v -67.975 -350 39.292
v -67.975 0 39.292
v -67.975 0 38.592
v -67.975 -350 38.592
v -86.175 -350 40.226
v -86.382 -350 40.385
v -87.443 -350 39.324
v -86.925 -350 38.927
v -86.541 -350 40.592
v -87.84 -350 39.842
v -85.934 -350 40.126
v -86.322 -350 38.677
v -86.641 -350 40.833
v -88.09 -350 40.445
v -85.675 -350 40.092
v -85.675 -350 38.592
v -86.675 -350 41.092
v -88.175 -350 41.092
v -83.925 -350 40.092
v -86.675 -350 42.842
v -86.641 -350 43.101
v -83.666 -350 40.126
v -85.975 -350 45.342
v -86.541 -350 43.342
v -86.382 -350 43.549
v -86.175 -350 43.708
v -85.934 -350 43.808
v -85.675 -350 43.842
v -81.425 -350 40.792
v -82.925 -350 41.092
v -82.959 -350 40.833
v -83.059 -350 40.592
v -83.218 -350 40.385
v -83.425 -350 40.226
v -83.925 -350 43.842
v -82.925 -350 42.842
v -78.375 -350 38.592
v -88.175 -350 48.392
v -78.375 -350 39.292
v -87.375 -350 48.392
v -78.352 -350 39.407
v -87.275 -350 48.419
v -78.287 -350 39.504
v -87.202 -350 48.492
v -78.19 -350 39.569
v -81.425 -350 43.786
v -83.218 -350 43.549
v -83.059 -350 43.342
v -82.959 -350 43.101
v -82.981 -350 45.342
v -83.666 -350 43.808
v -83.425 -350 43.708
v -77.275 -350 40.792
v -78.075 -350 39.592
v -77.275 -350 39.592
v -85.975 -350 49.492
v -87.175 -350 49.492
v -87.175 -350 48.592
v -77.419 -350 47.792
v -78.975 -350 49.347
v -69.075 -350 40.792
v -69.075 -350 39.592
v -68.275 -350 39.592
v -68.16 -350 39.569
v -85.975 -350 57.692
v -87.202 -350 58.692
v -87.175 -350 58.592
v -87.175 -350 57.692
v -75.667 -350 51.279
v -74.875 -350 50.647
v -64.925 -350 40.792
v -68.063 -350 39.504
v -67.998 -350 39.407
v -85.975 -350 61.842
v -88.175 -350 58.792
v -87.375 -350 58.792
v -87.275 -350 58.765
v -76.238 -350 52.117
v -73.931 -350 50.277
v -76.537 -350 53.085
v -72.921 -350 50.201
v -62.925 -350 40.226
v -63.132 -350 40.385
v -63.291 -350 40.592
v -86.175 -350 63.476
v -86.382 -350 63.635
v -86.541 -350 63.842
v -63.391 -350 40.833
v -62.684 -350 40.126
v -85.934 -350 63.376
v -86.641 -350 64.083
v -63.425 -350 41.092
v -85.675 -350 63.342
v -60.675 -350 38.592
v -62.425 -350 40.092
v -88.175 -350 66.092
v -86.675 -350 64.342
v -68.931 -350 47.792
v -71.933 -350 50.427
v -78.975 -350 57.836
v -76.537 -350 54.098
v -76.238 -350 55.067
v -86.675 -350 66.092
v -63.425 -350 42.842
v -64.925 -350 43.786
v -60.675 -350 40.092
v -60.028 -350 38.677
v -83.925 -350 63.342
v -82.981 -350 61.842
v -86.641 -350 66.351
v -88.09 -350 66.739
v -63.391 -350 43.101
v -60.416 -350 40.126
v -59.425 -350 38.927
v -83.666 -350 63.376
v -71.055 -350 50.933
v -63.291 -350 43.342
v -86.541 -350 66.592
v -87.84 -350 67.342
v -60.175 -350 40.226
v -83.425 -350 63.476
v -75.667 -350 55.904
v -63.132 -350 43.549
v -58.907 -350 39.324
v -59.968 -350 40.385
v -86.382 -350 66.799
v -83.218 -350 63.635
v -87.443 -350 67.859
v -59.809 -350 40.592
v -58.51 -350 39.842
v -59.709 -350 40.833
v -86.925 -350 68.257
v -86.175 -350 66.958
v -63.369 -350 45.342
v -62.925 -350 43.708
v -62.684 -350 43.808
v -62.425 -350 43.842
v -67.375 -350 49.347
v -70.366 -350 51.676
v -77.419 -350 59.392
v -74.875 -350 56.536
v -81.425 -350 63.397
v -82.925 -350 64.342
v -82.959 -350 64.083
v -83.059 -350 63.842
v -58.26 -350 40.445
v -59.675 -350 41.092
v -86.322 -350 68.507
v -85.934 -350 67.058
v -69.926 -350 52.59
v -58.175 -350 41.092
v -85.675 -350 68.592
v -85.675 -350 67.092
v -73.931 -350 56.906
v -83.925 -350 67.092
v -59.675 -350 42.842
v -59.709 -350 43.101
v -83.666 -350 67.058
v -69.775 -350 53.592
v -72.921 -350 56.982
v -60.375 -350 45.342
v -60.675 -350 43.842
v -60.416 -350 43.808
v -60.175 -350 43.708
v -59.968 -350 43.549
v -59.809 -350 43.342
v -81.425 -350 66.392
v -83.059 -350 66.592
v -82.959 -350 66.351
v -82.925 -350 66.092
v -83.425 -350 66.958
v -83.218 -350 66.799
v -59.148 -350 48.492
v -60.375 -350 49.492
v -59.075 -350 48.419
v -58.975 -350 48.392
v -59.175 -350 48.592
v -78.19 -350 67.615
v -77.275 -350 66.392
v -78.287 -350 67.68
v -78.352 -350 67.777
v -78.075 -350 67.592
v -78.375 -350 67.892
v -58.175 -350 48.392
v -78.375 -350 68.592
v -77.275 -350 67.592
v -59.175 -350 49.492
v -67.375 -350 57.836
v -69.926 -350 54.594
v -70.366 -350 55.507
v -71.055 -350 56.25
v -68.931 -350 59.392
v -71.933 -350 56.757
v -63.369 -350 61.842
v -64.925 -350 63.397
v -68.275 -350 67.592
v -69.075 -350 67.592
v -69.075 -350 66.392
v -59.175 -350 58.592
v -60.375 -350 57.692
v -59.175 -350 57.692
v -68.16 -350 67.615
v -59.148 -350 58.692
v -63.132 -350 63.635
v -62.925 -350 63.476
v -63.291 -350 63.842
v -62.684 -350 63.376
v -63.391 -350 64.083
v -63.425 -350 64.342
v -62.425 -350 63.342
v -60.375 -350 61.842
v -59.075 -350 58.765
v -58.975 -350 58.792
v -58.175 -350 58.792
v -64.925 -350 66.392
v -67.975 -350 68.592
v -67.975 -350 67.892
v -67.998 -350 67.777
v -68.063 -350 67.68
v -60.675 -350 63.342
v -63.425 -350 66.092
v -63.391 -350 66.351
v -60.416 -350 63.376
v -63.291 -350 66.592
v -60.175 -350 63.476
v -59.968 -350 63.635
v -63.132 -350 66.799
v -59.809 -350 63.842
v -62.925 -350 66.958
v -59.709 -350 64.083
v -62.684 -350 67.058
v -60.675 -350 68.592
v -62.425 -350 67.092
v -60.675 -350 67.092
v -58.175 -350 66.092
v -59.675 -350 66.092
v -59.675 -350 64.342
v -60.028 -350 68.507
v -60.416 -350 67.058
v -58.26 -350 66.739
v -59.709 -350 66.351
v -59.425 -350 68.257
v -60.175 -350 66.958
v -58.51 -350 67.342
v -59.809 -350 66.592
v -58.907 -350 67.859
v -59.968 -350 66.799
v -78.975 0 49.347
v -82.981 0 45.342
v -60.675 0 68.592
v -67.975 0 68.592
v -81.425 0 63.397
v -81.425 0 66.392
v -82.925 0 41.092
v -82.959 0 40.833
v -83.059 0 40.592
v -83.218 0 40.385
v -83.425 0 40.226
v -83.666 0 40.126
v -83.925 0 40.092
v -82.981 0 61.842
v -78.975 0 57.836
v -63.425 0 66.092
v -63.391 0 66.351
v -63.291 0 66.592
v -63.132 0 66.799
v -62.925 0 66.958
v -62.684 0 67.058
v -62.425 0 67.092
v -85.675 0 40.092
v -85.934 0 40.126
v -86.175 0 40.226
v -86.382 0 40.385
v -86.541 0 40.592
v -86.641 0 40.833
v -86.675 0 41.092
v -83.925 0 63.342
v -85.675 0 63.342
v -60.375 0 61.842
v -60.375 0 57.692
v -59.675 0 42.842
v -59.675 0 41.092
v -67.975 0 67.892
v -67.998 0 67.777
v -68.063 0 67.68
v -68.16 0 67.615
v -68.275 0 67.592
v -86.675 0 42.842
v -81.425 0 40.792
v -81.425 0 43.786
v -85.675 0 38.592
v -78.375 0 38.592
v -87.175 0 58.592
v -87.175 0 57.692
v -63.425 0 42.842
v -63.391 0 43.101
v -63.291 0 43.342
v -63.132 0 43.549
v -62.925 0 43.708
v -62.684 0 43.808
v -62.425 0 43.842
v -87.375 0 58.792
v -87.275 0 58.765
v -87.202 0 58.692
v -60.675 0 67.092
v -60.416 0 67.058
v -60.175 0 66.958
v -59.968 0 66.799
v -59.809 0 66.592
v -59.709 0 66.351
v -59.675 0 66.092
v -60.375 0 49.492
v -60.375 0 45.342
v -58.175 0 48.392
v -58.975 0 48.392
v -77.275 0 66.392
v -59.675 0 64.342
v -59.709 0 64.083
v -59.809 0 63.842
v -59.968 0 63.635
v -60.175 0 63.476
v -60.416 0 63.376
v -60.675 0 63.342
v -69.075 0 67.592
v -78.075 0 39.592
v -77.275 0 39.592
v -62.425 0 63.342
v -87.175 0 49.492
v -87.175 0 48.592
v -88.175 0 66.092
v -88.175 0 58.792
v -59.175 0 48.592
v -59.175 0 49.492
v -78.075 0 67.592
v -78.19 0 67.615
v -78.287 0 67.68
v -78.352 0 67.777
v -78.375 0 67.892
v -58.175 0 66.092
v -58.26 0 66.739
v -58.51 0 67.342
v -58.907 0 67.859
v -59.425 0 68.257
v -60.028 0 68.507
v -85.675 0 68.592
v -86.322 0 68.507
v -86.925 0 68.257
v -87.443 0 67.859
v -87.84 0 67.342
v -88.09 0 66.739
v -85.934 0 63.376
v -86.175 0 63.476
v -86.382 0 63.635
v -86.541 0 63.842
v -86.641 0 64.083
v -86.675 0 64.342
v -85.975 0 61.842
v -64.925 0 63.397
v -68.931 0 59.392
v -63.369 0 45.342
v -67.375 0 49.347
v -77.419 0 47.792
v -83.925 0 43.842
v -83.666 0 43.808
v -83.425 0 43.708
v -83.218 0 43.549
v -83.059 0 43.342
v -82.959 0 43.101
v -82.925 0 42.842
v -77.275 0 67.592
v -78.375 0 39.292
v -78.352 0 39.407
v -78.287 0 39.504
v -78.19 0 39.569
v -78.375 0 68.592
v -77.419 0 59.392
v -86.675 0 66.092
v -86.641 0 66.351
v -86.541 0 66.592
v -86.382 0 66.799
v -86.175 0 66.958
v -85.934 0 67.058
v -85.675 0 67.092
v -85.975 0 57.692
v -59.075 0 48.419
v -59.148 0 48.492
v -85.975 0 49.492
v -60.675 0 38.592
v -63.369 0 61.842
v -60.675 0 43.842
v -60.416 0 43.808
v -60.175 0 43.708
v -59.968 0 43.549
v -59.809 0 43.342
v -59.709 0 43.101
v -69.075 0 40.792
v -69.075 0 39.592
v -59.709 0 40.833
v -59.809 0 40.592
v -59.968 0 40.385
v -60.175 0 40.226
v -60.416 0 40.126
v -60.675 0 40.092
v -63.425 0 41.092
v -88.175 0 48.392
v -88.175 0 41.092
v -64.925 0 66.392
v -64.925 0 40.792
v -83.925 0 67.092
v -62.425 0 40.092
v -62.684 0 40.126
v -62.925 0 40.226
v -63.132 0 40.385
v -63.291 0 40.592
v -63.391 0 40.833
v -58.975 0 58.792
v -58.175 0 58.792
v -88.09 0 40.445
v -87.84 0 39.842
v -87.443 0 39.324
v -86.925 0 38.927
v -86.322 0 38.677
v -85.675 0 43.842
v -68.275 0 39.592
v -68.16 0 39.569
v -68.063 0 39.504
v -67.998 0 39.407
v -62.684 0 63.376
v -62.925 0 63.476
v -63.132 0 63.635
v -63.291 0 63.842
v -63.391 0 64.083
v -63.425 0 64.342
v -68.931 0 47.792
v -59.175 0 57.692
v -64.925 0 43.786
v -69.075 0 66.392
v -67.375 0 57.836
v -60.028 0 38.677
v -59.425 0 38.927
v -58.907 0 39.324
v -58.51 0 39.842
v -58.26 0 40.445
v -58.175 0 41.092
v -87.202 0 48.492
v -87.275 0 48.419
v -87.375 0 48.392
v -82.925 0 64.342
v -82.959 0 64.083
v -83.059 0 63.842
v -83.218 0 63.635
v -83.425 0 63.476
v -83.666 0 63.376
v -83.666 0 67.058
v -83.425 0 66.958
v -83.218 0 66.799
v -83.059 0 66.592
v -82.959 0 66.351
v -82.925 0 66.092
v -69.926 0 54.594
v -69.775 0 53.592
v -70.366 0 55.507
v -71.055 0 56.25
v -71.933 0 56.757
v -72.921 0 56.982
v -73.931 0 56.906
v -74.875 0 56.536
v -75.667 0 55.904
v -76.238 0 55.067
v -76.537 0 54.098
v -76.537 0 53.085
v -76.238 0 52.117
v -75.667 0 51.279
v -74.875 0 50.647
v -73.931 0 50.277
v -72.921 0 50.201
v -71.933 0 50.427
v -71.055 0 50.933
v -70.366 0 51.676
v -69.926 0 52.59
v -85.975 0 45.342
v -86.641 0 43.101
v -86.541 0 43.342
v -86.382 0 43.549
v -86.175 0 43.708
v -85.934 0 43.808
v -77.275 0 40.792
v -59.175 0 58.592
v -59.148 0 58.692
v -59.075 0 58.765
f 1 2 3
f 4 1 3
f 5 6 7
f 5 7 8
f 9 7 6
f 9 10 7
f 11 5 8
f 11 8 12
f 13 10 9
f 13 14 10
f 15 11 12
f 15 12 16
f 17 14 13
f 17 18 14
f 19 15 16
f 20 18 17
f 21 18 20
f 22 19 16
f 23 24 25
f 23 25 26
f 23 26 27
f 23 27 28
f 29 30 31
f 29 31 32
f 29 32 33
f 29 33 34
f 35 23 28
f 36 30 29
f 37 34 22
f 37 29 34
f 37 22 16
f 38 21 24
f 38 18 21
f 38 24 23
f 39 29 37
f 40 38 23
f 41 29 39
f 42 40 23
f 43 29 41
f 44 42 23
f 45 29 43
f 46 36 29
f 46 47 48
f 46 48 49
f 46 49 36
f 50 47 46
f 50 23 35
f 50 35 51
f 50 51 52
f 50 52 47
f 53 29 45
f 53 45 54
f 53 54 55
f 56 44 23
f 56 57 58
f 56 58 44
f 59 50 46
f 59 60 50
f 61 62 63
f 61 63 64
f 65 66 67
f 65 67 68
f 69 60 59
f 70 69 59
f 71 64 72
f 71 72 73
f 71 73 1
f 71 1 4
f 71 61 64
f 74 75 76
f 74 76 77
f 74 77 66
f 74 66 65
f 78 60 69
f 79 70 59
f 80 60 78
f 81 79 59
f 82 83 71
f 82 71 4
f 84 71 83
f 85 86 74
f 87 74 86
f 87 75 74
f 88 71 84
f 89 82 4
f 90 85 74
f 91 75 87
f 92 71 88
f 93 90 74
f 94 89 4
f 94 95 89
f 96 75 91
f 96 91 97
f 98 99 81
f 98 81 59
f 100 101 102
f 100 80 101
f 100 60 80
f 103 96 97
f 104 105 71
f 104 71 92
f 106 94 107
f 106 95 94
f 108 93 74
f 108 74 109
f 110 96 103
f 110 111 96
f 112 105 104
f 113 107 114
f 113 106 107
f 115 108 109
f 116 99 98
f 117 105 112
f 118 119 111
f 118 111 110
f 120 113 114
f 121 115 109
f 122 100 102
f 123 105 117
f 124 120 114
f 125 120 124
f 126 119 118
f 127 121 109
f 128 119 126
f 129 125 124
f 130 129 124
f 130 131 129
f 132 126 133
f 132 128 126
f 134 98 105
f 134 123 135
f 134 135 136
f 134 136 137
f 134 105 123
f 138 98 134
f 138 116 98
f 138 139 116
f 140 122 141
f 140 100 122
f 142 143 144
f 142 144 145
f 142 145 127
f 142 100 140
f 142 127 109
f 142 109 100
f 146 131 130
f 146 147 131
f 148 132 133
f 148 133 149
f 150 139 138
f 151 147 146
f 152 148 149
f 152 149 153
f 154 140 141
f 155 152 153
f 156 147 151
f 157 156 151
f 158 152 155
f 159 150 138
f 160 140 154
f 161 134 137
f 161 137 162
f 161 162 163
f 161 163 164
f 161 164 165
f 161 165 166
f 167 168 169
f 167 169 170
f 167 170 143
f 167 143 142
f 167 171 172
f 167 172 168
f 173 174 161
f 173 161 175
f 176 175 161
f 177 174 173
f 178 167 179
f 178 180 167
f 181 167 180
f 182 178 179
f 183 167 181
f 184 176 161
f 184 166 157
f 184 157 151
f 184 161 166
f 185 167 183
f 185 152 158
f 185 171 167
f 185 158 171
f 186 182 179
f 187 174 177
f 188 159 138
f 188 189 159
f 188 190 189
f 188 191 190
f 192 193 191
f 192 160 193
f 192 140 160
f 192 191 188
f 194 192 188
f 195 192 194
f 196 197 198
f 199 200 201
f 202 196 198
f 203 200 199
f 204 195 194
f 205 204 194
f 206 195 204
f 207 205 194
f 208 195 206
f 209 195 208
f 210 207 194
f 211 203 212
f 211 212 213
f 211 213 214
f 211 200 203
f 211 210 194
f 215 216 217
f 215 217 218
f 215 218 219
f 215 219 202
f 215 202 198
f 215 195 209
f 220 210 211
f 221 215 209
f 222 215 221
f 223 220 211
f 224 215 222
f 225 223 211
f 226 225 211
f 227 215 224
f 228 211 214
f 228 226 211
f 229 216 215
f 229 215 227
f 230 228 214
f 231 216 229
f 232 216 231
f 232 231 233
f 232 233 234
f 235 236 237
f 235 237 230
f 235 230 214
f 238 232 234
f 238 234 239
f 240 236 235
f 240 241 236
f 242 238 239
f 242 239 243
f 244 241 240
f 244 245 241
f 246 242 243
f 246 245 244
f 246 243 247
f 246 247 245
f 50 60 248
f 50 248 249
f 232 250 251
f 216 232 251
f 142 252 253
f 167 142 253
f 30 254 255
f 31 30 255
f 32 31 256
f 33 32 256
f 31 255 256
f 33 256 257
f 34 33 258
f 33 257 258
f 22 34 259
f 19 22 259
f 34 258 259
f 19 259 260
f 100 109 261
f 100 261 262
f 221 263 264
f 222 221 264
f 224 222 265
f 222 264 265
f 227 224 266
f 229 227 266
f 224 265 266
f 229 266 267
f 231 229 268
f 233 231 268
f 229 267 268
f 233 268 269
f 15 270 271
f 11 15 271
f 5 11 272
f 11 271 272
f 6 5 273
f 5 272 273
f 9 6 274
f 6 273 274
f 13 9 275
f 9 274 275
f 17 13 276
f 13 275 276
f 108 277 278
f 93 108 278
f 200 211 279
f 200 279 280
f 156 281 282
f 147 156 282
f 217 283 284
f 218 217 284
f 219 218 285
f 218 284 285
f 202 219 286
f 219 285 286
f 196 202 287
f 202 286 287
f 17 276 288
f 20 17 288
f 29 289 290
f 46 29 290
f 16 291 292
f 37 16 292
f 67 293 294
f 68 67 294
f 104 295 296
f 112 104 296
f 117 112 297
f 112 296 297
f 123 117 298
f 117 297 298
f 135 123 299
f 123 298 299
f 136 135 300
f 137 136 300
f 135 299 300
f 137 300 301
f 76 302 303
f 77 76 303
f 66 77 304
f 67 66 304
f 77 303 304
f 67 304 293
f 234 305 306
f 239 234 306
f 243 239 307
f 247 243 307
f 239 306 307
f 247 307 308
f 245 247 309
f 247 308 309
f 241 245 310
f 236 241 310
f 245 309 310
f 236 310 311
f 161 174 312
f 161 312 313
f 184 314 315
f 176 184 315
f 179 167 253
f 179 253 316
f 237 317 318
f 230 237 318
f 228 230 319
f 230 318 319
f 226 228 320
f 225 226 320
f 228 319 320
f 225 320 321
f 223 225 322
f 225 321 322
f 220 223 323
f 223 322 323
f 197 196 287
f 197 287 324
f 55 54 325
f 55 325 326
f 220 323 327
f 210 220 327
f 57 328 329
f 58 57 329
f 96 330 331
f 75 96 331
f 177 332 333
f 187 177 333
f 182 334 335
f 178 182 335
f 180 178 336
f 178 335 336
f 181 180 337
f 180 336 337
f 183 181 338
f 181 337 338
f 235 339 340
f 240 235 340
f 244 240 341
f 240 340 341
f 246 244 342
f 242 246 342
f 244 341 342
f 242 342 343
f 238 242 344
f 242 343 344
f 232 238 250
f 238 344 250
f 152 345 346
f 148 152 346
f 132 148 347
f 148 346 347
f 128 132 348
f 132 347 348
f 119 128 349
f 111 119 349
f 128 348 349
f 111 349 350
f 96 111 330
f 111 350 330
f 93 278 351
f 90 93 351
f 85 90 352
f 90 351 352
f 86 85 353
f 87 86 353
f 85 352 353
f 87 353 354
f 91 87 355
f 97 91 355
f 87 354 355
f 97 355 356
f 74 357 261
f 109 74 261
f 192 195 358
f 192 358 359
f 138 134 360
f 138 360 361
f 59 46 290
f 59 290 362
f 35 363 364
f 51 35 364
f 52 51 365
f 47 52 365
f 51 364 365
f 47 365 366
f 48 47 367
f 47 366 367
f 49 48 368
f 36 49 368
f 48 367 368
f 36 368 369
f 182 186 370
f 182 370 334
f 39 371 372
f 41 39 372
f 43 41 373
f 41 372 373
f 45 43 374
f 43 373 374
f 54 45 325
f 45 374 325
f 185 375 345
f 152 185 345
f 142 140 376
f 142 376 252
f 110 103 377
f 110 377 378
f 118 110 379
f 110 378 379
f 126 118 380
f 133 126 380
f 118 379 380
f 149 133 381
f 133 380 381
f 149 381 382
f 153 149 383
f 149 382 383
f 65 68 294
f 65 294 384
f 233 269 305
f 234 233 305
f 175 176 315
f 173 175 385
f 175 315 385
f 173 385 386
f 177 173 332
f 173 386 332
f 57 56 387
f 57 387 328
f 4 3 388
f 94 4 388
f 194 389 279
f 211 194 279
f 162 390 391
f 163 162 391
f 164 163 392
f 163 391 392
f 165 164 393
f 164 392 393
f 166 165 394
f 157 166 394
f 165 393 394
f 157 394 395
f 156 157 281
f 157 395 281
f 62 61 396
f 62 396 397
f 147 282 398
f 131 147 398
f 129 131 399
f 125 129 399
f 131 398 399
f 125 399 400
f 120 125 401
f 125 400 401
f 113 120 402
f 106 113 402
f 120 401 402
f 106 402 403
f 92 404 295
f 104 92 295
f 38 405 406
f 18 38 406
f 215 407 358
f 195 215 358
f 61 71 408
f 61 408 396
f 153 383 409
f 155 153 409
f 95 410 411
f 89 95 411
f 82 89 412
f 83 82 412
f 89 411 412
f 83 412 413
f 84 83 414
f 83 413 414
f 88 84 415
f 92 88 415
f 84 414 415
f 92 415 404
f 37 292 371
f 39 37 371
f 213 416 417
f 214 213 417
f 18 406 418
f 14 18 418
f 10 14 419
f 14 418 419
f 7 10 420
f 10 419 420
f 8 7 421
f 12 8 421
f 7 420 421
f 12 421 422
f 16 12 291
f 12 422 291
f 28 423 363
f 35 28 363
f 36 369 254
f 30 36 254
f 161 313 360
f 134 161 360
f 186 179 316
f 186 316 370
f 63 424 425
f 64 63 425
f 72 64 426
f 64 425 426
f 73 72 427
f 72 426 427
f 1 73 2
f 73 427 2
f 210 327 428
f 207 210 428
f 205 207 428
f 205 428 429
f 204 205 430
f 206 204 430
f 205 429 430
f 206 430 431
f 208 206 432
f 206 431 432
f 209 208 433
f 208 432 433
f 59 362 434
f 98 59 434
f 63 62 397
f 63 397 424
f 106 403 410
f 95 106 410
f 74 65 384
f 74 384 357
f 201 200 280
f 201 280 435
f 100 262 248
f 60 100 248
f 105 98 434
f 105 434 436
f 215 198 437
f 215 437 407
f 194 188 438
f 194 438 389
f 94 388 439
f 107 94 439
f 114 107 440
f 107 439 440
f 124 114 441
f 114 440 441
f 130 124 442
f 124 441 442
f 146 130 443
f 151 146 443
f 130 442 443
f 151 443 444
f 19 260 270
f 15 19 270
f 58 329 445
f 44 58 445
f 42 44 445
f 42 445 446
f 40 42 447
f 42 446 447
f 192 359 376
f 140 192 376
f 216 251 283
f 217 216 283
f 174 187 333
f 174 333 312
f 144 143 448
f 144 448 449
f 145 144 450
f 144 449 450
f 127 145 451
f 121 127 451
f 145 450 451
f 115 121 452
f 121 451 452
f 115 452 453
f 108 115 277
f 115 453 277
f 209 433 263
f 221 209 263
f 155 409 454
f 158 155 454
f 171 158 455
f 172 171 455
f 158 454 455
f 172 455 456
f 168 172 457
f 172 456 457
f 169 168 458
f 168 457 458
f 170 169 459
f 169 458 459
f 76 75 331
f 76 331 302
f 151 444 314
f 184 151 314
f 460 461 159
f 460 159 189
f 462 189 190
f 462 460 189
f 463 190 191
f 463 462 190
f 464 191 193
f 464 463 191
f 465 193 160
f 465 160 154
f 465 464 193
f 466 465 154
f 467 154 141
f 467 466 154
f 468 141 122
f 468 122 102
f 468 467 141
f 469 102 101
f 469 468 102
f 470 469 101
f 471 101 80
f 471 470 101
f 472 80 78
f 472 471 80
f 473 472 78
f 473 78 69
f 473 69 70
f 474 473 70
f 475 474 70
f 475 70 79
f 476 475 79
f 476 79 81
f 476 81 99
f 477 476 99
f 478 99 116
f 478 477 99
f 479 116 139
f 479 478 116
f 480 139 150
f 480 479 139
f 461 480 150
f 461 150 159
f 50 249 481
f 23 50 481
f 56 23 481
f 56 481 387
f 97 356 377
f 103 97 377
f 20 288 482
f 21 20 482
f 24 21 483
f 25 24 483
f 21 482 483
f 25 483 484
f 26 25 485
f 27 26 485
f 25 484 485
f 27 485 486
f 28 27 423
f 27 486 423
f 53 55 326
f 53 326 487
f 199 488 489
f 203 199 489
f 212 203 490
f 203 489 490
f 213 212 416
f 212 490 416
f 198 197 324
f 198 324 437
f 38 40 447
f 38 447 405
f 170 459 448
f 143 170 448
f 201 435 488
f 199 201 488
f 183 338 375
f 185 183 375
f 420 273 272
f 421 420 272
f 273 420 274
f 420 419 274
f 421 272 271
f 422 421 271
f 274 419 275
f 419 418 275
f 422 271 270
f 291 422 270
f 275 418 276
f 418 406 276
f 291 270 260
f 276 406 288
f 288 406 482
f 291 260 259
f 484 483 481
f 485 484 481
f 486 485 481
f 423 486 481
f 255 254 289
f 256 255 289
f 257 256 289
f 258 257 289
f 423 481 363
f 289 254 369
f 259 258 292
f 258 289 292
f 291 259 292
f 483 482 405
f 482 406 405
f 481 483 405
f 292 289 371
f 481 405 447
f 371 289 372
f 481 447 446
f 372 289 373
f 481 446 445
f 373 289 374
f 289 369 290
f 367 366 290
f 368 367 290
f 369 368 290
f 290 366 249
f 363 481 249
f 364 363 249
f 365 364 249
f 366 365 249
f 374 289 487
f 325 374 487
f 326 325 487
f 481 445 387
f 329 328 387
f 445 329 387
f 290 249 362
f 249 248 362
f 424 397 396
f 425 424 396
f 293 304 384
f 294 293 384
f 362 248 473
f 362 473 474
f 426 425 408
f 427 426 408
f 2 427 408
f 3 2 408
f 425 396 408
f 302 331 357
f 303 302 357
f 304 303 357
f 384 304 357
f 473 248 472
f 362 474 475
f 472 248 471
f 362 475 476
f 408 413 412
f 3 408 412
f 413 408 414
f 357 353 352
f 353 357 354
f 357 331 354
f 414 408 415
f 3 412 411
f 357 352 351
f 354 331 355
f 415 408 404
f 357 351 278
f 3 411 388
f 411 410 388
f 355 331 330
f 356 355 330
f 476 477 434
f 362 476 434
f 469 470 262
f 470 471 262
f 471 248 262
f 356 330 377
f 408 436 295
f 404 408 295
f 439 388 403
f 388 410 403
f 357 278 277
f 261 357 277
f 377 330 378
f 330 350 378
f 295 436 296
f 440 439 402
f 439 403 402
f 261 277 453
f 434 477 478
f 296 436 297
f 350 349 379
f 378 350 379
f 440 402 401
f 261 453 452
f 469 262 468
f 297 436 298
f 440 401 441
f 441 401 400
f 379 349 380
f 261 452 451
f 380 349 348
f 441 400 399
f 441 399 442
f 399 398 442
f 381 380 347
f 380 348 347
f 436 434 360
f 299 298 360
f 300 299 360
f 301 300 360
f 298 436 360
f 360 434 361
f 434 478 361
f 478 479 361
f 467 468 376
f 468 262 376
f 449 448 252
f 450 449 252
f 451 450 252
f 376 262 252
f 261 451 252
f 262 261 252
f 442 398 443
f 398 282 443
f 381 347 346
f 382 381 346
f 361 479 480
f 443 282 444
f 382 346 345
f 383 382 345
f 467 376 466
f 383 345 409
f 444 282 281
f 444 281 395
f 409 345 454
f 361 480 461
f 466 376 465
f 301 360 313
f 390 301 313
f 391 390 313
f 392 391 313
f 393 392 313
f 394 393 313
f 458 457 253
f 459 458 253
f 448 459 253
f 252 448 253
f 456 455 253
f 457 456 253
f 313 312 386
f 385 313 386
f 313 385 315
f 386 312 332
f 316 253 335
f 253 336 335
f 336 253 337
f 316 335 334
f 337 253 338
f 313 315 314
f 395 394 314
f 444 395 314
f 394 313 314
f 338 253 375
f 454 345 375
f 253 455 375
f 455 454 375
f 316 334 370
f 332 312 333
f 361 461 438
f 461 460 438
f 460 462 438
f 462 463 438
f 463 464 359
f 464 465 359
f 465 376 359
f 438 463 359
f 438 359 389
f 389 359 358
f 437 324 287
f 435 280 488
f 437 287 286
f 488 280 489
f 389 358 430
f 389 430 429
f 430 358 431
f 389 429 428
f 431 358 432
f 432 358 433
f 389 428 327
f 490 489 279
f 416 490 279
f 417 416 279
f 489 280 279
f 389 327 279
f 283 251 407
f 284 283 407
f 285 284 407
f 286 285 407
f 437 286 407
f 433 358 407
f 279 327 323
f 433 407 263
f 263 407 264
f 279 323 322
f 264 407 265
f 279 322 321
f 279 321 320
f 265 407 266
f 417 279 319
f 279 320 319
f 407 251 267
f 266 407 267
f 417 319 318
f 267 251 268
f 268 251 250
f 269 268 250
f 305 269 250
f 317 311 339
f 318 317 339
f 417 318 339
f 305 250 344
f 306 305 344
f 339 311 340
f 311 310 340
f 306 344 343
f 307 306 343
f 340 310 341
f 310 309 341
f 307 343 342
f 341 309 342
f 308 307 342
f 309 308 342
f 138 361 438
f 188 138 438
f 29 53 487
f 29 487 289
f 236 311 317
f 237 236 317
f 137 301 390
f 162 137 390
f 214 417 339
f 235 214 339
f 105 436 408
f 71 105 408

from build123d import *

# Parameters (mm, degrees)
F0_R     = 3.4
F1_DEPTH = 350


with BuildPart() as f1:
    # F0 (on Front) → F1 (new body)
    with BuildSketch(Plane.XZ):
        with BuildLine():
            Line((-67.97487, 38.591727), (-60.67487, 38.591727))
            ThreePointArc((-60.67487, 38.591727), (-58.907103, 39.32396), (-58.17487, 41.091727))
            Line((-58.17487, 41.091727), (-58.17487, 48.391727))
            Line((-58.17487, 48.391727), (-58.97487, 48.391727))
            ThreePointArc((-58.97487, 48.391727), (-59.116292, 48.450306), (-59.17487, 48.591727))
            Line((-59.17487, 48.591727), (-59.17487, 49.491727))
            Line((-59.17487, 49.491727), (-60.37487, 49.491727))
            Line((-60.37487, 49.491727), (-60.37487, 45.341727))
            Line((-60.37487, 45.341727), (-63.369235, 45.341727))
            Line((-63.369235, 45.341727), (-67.37487, 49.347362))
            Line((-67.37487, 49.347362), (-67.37487, 57.836092))
            Line((-67.37487, 57.836092), (-63.369235, 61.841727))
            Line((-63.369235, 61.841727), (-60.37487, 61.841727))
            Line((-60.37487, 61.841727), (-60.37487, 57.691727))
            Line((-60.37487, 57.691727), (-59.17487, 57.691727))
            Line((-59.17487, 57.691727), (-59.17487, 58.591727))
            ThreePointArc((-59.17487, 58.591727), (-59.116292, 58.733149), (-58.97487, 58.791727))
            Line((-58.97487, 58.791727), (-58.17487, 58.791727))
            Line((-58.17487, 58.791727), (-58.17487, 61.841727))
            Line((-58.17487, 61.841727), (-58.17487, 66.091727))
            ThreePointArc((-58.17487, 66.091727), (-58.907103, 67.859494), (-60.67487, 68.591727))
            Line((-60.67487, 68.591727), (-64.92487, 68.591727))
            Line((-64.92487, 68.591727), (-67.97487, 68.591727))
            Line((-67.97487, 68.591727), (-67.97487, 67.891727))
            ThreePointArc((-67.97487, 67.891727), (-68.062738, 67.679595), (-68.27487, 67.591727))
            Line((-68.27487, 67.591727), (-69.07487, 67.591727))
            Line((-69.07487, 67.591727), (-69.07487, 66.391727))
            Line((-69.07487, 66.391727), (-64.92487, 66.391727))
            Line((-64.92487, 66.391727), (-64.92487, 63.397362))
            Line((-64.92487, 63.397362), (-68.930505, 59.391727))
            Line((-68.930505, 59.391727), (-77.419235, 59.391727))
            Line((-77.419235, 59.391727), (-81.42487, 63.397362))
            Line((-81.42487, 63.397362), (-81.42487, 66.391727))
            Line((-81.42487, 66.391727), (-77.27487, 66.391727))
            Line((-77.27487, 66.391727), (-77.27487, 67.591727))
            Line((-77.27487, 67.591727), (-78.07487, 67.591727))
            ThreePointArc((-78.07487, 67.591727), (-78.287002, 67.679595), (-78.37487, 67.891727))
            Line((-78.37487, 67.891727), (-78.37487, 68.591727))
            Line((-78.37487, 68.591727), (-85.67487, 68.591727))
            ThreePointArc((-85.67487, 68.591727), (-87.442637, 67.859494), (-88.17487, 66.091727))
            Line((-88.17487, 66.091727), (-88.17487, 58.791727))
            Line((-88.17487, 58.791727), (-87.37487, 58.791727))
            ThreePointArc((-87.37487, 58.791727), (-87.233449, 58.733149), (-87.17487, 58.591727))
            Line((-87.17487, 58.591727), (-87.17487, 57.691727))
            Line((-87.17487, 57.691727), (-85.97487, 57.691727))
            Line((-85.97487, 57.691727), (-85.97487, 61.841727))
            Line((-85.97487, 61.841727), (-82.980505, 61.841727))
            Line((-82.980505, 61.841727), (-78.97487, 57.836092))
            Line((-78.97487, 57.836092), (-78.97487, 49.347362))
            Line((-78.97487, 49.347362), (-82.980505, 45.341727))
            Line((-82.980505, 45.341727), (-85.97487, 45.341727))
            Line((-85.97487, 45.341727), (-85.97487, 49.491727))
            Line((-85.97487, 49.491727), (-87.17487, 49.491727))
            Line((-87.17487, 49.491727), (-87.17487, 48.591727))
            ThreePointArc((-87.17487, 48.591727), (-87.233449, 48.450306), (-87.37487, 48.391727))
            Line((-87.37487, 48.391727), (-88.17487, 48.391727))
            Line((-88.17487, 48.391727), (-88.17487, 41.091727))
            ThreePointArc((-88.17487, 41.091727), (-87.442637, 39.32396), (-85.67487, 38.591727))
            Line((-85.67487, 38.591727), (-78.37487, 38.591727))
            Line((-78.37487, 38.591727), (-78.37487, 39.291727))
            ThreePointArc((-78.37487, 39.291727), (-78.287002, 39.503859), (-78.07487, 39.591727))
            Line((-78.07487, 39.591727), (-77.27487, 39.591727))
            Line((-77.27487, 39.591727), (-77.27487, 40.791727))
            Line((-77.27487, 40.791727), (-81.42487, 40.791727))
            Line((-81.42487, 40.791727), (-81.42487, 43.786092))
            Line((-81.42487, 43.786092), (-77.419235, 47.791727))
            Line((-77.419235, 47.791727), (-68.930505, 47.791727))
            Line((-68.930505, 47.791727), (-64.92487, 43.786092))
            Line((-64.92487, 43.786092), (-64.92487, 40.791727))
            Line((-64.92487, 40.791727), (-69.07487, 40.791727))
            Line((-69.07487, 40.791727), (-69.07487, 39.591727))
            Line((-69.07487, 39.591727), (-68.27487, 39.591727))
            ThreePointArc((-68.27487, 39.591727), (-68.062738, 39.503859), (-67.97487, 39.291727))
            Line((-67.97487, 39.291727), (-67.97487, 38.591727))
        make_face()
        with BuildLine():
            ThreePointArc((-83.92487, 43.841727), (-83.217764, 43.548834), (-82.92487, 42.841727))
            Line((-82.92487, 42.841727), (-82.92487, 41.091727))
            ThreePointArc((-82.92487, 41.091727), (-83.217764, 40.384621), (-83.92487, 40.091727))
            Line((-83.92487, 40.091727), (-85.67487, 40.091727))
            ThreePointArc((-85.67487, 40.091727), (-86.381977, 40.384621), (-86.67487, 41.091727))
            Line((-86.67487, 41.091727), (-86.67487, 42.841727))
            ThreePointArc((-86.67487, 42.841727), (-86.381977, 43.548834), (-85.67487, 43.841727))
            Line((-85.67487, 43.841727), (-83.92487, 43.841727))
        make_face(mode=Mode.SUBTRACT)
        with BuildLine():
            Line((-62.42487, 43.841727), (-60.67487, 43.841727))
            ThreePointArc((-60.67487, 43.841727), (-59.967764, 43.548834), (-59.67487, 42.841727))
            Line((-59.67487, 42.841727), (-59.67487, 41.091727))
            ThreePointArc((-59.67487, 41.091727), (-59.967764, 40.384621), (-60.67487, 40.091727))
            Line((-60.67487, 40.091727), (-62.42487, 40.091727))
            ThreePointArc((-62.42487, 40.091727), (-63.131977, 40.384621), (-63.42487, 41.091727))
            Line((-63.42487, 41.091727), (-63.42487, 42.841727))
            ThreePointArc((-63.42487, 42.841727), (-63.131977, 43.548834), (-62.42487, 43.841727))
        make_face(mode=Mode.SUBTRACT)
        with BuildLine():
            ThreePointArc((-86.67487, 66.091727), (-86.381977, 66.798834), (-85.67487, 67.091727))
            Line((-85.67487, 67.091727), (-83.92487, 67.091727))
            ThreePointArc((-83.92487, 67.091727), (-83.217764, 66.798834), (-82.92487, 66.091727))
            Line((-82.92487, 66.091727), (-82.92487, 64.341727))
            ThreePointArc((-82.92487, 64.341727), (-83.217764, 63.634621), (-83.92487, 63.341727))
            Line((-83.92487, 63.341727), (-85.67487, 63.341727))
            ThreePointArc((-85.67487, 63.341727), (-86.381977, 63.634621), (-86.67487, 64.341727))
            Line((-86.67487, 64.341727), (-86.67487, 66.091727))
        make_face(mode=Mode.SUBTRACT)
        with Locations((-73.17487, 53.591727)):
            Circle(F0_R, mode=Mode.SUBTRACT)
        with BuildLine():
            ThreePointArc((-59.67487, 64.341727), (-59.967764, 63.634621), (-60.67487, 63.341727))
            Line((-60.67487, 63.341727), (-62.42487, 63.341727))
            ThreePointArc((-62.42487, 63.341727), (-63.131977, 63.634621), (-63.42487, 64.341727))
            Line((-63.42487, 64.341727), (-63.42487, 66.091727))
            ThreePointArc((-63.42487, 66.091727), (-63.131977, 66.798834), (-62.42487, 67.091727))
            Line((-62.42487, 67.091727), (-60.67487, 67.091727))
            ThreePointArc((-60.67487, 67.091727), (-59.967764, 66.798834), (-59.67487, 66.091727))
            Line((-59.67487, 66.091727), (-59.67487, 64.341727))
        make_face(mode=Mode.SUBTRACT)
    extrude(amount=F1_DEPTH)


solid = f1.part
